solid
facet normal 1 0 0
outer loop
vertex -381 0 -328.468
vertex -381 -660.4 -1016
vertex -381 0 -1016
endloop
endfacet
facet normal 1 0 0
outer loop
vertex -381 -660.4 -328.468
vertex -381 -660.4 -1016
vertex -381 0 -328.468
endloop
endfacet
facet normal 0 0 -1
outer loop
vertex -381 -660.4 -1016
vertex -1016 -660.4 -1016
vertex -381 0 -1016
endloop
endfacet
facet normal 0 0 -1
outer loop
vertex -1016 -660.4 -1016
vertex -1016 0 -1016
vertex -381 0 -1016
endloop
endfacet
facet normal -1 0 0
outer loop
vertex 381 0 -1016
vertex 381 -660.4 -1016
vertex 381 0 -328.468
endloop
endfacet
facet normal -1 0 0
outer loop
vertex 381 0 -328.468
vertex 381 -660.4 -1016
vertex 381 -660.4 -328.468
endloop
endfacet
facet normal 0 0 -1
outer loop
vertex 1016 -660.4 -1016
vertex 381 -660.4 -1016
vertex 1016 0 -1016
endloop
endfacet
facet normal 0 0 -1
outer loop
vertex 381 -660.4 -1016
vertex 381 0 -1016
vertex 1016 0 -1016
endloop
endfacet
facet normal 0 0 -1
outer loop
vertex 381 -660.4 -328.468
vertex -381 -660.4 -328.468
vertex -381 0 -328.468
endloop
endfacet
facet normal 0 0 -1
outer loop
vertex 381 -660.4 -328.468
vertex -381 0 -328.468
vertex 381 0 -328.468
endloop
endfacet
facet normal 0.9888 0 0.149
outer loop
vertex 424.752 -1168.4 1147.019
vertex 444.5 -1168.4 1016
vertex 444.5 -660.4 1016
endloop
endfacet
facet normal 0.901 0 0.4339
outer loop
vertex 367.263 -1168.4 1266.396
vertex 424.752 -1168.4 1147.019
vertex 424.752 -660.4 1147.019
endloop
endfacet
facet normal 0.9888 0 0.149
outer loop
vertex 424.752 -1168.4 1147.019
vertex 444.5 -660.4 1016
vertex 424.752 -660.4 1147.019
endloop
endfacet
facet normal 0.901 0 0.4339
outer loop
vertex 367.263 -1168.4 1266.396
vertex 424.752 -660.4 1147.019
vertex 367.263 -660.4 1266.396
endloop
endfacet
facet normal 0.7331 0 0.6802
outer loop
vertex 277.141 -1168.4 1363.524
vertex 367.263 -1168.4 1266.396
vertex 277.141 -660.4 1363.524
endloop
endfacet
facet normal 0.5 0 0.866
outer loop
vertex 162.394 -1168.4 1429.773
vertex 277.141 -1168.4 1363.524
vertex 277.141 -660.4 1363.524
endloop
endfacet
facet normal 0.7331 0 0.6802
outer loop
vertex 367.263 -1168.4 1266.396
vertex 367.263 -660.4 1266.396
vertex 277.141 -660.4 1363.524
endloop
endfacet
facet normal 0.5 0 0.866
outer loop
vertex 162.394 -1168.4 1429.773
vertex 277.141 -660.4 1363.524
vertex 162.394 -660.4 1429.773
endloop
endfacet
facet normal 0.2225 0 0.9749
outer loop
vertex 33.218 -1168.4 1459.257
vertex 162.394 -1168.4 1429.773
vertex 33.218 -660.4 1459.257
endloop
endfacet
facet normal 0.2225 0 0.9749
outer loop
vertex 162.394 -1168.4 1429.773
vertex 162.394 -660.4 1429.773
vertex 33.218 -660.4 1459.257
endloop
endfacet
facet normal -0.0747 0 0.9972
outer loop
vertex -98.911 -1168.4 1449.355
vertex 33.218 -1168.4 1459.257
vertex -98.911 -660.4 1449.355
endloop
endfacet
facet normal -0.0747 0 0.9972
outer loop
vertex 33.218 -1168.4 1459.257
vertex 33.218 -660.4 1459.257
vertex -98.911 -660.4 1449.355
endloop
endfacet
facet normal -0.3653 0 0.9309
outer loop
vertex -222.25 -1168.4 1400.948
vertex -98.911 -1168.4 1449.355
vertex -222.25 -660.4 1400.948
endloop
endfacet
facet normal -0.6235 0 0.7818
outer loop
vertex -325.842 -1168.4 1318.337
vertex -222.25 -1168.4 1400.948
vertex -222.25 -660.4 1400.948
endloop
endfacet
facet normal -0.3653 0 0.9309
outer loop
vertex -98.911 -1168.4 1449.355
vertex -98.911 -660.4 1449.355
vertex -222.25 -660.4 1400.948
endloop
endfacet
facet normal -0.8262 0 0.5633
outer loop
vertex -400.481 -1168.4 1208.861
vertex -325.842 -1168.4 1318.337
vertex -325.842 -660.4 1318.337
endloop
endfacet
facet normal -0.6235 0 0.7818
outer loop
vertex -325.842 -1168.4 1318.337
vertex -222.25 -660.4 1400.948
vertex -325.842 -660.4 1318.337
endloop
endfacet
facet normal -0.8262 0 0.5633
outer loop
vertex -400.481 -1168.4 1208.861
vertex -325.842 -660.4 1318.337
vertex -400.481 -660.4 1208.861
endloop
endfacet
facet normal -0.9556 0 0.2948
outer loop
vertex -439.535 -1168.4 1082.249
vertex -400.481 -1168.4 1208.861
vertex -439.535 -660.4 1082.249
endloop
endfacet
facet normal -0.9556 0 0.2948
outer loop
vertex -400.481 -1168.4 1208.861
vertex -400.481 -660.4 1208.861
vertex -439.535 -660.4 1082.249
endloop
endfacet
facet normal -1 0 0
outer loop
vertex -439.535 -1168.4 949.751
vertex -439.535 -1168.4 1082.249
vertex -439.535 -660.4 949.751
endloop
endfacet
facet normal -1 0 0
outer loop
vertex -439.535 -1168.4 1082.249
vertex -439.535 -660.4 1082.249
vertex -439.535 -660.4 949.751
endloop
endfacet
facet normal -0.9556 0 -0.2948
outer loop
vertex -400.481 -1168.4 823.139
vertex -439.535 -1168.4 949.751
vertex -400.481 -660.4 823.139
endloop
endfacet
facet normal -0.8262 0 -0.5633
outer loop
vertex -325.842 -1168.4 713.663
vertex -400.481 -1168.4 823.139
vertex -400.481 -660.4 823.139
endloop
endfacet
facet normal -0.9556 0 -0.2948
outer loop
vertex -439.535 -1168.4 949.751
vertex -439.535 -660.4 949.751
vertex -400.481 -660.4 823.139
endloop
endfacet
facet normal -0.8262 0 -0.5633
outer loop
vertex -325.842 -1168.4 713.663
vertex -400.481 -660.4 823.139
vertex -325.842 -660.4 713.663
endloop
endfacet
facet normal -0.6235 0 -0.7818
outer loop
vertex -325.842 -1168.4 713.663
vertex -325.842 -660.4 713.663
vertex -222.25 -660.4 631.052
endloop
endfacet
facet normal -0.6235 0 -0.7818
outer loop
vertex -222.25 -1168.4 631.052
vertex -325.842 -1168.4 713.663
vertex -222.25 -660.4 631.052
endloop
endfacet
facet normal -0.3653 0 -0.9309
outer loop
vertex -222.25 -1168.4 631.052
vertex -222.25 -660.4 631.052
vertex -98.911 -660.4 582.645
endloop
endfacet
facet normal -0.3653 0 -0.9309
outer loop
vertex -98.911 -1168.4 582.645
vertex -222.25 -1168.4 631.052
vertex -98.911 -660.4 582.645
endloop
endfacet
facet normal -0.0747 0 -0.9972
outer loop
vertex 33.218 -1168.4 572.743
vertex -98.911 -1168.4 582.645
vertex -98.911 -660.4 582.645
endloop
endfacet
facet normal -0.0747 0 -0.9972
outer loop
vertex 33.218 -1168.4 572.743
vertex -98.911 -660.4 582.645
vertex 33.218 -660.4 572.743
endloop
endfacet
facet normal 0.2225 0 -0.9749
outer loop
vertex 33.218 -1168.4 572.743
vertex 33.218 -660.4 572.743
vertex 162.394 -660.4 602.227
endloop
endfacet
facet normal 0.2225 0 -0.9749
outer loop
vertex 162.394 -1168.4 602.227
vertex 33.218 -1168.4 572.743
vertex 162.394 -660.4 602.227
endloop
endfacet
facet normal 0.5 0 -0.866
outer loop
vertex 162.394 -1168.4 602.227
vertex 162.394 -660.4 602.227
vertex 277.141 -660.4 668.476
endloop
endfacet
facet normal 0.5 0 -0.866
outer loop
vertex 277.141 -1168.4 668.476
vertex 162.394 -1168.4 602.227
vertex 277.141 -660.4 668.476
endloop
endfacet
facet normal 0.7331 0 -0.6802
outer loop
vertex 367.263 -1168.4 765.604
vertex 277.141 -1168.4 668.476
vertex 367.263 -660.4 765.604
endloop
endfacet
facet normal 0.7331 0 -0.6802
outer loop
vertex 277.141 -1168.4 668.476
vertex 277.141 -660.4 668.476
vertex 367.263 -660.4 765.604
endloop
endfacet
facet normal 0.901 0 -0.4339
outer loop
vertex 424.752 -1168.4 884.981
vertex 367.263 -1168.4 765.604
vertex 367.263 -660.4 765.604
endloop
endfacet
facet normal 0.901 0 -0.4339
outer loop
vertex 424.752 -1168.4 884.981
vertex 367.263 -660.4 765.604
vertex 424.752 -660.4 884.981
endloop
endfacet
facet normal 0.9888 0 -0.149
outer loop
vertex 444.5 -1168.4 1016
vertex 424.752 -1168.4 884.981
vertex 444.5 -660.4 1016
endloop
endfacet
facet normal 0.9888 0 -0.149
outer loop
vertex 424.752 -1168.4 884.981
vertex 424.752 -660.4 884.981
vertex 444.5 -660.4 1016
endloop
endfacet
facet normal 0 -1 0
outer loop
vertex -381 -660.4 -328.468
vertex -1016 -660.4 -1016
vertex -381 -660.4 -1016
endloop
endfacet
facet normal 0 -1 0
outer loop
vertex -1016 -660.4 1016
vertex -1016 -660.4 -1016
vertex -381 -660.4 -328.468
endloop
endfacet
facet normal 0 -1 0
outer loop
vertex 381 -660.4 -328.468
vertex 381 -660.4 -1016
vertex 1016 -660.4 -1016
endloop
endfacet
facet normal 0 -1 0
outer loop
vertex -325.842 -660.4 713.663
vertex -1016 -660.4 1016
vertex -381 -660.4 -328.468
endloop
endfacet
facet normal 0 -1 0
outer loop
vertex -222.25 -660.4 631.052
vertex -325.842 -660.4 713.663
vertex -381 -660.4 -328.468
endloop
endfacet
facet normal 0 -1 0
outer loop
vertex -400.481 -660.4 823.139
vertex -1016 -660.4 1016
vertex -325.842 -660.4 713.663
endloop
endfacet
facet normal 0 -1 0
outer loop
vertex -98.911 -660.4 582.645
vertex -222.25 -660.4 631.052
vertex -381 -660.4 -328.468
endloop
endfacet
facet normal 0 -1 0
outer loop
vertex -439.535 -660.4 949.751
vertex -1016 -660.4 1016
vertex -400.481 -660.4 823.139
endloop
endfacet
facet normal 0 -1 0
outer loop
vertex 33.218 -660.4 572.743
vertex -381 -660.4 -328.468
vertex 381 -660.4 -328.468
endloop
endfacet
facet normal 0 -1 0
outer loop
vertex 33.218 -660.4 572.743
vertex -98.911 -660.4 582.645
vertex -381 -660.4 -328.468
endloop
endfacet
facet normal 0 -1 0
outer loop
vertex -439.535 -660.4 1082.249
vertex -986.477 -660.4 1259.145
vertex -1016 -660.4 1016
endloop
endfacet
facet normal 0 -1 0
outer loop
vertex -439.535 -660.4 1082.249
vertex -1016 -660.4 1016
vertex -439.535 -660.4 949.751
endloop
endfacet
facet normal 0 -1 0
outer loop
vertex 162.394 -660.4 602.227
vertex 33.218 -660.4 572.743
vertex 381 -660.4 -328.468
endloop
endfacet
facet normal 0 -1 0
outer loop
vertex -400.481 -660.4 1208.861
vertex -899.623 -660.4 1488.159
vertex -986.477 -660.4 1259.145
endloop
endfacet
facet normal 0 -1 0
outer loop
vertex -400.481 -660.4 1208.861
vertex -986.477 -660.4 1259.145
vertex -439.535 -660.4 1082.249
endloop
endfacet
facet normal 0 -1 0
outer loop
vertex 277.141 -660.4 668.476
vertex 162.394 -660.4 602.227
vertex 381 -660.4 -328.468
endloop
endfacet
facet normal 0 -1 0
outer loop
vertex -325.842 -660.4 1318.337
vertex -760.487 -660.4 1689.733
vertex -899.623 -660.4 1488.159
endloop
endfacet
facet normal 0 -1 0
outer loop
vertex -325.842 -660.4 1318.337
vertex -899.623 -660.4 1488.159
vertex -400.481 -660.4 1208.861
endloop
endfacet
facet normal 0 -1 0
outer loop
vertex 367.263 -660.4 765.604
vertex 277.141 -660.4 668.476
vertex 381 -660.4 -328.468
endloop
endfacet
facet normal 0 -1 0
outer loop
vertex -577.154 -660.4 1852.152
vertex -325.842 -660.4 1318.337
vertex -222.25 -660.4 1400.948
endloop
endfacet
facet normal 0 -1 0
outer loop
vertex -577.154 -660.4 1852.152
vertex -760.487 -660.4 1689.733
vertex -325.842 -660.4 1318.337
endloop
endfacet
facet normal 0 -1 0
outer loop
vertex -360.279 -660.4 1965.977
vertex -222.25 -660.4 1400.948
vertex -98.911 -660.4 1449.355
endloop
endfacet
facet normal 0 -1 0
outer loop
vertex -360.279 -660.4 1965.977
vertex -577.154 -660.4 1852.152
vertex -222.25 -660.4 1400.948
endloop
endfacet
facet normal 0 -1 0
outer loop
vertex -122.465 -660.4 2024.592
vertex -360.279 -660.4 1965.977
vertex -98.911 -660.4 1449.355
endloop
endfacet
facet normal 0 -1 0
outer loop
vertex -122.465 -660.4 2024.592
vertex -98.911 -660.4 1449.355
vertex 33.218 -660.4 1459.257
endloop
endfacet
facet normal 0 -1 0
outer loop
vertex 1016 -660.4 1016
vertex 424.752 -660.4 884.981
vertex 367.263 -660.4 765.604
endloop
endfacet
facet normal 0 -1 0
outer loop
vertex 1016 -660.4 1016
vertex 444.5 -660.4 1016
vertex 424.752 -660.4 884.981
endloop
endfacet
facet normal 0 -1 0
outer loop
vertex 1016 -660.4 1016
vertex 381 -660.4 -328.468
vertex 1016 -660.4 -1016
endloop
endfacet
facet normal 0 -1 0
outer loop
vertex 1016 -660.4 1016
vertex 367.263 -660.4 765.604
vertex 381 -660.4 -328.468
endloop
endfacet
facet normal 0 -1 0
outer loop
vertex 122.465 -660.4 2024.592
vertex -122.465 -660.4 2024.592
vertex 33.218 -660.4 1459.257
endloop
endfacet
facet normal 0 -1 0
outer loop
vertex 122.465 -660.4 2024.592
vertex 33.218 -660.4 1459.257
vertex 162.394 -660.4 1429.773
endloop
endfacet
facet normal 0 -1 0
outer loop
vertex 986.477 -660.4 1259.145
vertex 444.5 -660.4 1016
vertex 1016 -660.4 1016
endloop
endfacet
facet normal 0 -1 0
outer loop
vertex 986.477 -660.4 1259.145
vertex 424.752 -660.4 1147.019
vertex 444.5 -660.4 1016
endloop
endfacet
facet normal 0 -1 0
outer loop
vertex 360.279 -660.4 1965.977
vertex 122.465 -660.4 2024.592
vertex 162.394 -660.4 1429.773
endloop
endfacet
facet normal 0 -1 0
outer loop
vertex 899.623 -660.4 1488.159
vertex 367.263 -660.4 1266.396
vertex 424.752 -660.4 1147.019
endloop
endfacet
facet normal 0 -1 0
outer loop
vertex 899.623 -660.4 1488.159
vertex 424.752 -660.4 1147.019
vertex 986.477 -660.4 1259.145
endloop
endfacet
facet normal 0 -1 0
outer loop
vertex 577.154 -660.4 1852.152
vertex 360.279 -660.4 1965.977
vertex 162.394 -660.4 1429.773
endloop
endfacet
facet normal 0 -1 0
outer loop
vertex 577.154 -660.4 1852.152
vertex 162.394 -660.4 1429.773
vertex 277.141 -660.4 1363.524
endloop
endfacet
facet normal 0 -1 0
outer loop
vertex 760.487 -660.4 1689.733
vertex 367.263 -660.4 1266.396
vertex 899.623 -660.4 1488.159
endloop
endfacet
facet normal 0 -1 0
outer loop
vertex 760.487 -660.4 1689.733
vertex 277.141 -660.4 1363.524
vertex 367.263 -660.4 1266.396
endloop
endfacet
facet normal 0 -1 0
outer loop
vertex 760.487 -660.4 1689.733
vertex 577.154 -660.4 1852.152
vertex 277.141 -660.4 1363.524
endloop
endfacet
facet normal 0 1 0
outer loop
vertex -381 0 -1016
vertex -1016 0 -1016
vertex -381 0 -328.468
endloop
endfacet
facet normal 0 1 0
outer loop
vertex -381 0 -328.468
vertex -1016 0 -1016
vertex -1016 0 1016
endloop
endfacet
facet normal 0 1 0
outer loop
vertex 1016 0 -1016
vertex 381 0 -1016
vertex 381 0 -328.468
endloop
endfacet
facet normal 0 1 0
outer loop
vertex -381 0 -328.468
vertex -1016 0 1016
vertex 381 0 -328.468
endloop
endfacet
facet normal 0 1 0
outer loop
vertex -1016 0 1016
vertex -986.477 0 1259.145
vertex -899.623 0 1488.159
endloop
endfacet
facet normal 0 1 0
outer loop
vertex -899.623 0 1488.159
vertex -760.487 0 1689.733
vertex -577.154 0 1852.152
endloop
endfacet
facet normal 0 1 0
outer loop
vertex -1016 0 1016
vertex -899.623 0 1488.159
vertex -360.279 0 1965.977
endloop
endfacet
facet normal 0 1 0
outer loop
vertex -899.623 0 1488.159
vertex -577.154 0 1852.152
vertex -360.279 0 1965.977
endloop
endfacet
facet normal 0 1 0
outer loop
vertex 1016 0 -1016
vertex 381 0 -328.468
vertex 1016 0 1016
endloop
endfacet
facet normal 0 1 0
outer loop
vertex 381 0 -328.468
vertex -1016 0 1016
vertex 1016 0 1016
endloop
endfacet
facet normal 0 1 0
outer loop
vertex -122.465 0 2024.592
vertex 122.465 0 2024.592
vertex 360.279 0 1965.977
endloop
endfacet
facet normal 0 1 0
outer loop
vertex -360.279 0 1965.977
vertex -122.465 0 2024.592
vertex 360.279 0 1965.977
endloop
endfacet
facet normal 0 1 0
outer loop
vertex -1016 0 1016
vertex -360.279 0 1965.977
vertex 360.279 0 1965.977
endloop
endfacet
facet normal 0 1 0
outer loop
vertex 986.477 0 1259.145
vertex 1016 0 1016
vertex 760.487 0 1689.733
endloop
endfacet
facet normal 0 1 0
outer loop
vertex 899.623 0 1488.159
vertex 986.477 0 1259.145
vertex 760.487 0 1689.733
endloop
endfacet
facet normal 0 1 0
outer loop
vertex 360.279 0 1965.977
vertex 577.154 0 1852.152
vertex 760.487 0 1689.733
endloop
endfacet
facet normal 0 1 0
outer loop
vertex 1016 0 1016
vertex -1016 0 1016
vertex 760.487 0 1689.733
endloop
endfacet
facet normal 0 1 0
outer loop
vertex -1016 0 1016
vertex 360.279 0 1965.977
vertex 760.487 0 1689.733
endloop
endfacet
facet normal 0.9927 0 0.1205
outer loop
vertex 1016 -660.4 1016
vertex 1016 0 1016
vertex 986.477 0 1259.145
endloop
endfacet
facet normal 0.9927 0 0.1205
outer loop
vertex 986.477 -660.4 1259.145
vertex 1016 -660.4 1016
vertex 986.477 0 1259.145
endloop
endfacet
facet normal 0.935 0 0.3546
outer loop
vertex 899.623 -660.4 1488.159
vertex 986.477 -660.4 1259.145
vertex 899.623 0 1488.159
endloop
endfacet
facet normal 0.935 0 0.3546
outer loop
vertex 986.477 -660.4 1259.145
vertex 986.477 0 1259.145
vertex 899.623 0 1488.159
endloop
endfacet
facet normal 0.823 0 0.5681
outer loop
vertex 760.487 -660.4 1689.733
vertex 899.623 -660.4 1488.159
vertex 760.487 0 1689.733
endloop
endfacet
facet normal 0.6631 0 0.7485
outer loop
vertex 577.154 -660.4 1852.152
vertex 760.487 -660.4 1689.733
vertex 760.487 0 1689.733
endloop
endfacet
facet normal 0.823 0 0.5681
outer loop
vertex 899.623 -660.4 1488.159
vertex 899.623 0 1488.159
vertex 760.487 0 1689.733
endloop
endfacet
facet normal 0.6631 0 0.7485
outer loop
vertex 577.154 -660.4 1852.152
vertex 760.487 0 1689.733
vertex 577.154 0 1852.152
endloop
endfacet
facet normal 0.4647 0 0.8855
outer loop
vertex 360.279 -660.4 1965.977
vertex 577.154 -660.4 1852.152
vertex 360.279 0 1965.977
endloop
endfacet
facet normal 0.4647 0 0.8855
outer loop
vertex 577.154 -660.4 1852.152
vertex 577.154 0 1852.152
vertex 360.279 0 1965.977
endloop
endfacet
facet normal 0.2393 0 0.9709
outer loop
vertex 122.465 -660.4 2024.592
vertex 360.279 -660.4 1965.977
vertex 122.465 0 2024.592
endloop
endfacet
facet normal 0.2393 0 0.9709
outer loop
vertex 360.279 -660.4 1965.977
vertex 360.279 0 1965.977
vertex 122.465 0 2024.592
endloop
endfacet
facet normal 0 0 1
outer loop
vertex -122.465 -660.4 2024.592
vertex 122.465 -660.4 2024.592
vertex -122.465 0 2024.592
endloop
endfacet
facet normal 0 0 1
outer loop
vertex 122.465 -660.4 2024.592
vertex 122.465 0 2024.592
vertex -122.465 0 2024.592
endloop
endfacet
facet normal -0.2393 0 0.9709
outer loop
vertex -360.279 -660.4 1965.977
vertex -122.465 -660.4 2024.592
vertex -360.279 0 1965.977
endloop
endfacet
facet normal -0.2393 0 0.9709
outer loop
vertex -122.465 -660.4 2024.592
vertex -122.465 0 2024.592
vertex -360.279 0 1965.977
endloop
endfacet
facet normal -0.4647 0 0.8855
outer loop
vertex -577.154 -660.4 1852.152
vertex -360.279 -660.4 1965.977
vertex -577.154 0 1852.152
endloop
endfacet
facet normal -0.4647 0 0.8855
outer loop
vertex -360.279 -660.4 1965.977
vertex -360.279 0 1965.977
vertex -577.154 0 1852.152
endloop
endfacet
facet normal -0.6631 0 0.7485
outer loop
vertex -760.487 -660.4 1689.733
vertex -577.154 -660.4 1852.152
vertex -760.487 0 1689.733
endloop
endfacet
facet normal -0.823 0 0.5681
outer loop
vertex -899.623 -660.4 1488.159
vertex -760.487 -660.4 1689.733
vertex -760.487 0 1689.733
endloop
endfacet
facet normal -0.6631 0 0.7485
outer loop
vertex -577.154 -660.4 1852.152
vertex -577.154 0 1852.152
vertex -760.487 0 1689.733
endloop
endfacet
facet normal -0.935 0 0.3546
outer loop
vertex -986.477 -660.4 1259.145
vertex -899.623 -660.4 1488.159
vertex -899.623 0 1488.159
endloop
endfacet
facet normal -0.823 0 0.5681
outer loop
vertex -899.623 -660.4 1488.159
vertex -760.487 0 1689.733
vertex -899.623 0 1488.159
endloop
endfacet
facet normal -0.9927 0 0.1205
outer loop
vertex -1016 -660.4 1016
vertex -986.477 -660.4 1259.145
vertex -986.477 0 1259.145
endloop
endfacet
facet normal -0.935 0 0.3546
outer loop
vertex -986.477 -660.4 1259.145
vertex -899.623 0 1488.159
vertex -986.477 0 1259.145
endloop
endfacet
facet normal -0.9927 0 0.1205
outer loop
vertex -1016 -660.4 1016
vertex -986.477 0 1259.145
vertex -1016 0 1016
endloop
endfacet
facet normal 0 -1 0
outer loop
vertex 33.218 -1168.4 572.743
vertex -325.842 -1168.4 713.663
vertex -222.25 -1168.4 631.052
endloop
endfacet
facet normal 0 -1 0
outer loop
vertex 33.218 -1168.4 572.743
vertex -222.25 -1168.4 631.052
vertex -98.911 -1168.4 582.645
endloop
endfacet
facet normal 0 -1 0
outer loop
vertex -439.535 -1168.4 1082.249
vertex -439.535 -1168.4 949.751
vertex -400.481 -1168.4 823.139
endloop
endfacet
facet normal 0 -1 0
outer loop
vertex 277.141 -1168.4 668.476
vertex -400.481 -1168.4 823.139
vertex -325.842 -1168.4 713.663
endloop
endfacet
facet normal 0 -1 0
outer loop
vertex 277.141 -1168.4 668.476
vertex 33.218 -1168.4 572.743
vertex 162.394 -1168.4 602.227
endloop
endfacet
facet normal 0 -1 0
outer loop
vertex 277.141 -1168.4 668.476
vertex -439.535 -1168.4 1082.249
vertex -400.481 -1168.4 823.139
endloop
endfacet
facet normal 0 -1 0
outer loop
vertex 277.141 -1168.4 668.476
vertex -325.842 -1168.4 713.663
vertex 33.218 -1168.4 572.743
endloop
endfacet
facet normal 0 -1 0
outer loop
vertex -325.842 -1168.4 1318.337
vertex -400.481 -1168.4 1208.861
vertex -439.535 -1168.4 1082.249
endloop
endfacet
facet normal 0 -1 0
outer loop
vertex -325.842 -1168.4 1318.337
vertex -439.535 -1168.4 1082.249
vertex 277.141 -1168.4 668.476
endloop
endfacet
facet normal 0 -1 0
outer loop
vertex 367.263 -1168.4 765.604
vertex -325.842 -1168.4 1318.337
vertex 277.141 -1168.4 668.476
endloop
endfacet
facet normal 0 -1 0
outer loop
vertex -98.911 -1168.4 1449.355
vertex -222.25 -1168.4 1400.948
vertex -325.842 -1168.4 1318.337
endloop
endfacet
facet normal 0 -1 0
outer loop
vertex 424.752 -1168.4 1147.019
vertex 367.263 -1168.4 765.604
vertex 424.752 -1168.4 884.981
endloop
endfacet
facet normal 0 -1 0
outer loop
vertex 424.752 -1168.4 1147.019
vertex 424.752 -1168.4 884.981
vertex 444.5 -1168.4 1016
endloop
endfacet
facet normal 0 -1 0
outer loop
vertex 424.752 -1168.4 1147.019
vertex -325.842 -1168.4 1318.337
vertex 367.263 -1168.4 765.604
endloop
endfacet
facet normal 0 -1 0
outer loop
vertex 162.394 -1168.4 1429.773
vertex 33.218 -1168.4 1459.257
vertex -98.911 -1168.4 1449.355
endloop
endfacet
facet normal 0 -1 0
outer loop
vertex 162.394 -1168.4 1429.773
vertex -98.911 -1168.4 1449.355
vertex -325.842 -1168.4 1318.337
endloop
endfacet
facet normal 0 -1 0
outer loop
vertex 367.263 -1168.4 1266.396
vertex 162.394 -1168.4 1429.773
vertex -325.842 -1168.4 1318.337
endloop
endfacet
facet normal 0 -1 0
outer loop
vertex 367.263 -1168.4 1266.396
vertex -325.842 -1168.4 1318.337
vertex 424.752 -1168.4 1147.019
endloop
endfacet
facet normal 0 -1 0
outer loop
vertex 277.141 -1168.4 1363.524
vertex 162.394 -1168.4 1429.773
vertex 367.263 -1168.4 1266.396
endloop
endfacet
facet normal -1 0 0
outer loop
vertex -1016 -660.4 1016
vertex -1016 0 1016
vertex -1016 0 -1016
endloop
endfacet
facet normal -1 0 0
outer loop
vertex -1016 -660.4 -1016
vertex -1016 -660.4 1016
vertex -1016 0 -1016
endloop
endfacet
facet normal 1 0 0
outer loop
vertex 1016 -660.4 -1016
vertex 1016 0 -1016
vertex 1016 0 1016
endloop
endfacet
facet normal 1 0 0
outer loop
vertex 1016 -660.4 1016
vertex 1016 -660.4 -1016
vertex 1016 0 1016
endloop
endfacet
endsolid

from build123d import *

# Parameters (mm, degrees)
F0_W     = 762
F0_H     = 635
F1_DEPTH = 635
F2_DEPTH = 25.4
F3_W     = 762
F3_H     = 1322.5318927765
F4_DEPTH = 660.401
F5_R     = 444.5
F6_DEPTH = 508


with BuildPart() as f1:
    # F0 (on Front) → F1 (new body)
    with BuildSketch(Plane.XZ):
        with BuildLine():
            ThreePointArc((-1016, 1016), (0, 0), (1016, 1016))
            Line((1016, 1016), (-1016, 1016))
        make_face()
        with Locations((0, -1333.5)):
            Rectangle(F0_W, F0_H)
        with BuildLine():
            Line((381, -1016), (1016, -1016))
            Line((1016, -1016), (1016, 1016))
            ThreePointArc((1016, 1016), (0, 0), (-1016, 1016))
            Line((-1016, 1016), (-1016, -1016))
            Line((-1016, -1016), (-381, -1016))
            Line((-381, -1016), (-381, -381))
            Line((-381, -381), (381, -381))
            Line((381, -381), (381, -1016))
        make_face()
        with Locations((0, -698.5)):
            Rectangle(F0_W, F0_H)
        with BuildLine():
            Line((-1016, 1016), (1016, 1016))
            ThreePointArc((1016, 1016), (0, 2032), (-1016, 1016))
        make_face()
    extrude(amount=F1_DEPTH)

    # F2 (add): a face of the model
    f2_faces = [f1.faces().sort_by_distance(p)[0] for p in [
        (0, -635, 272.8986892682),
    ]]
    extrude(f2_faces, amount=F2_DEPTH)

    # F3 (on face) → F4 (cut, through all)
    with BuildSketch(Plane.XZ.offset(660.4)):
        with Locations((0, -989.7340536118)):
            Rectangle(F3_W, F3_H)
    extrude(amount=-F4_DEPTH, mode=Mode.SUBTRACT)

    # F5 (on face) → F6 (join)
    with BuildSketch(Plane.XZ.offset(660.4)):
        with Locations((0, 1016)):
            Circle(F5_R)
    extrude(amount=F6_DEPTH)


solid = f1.part
